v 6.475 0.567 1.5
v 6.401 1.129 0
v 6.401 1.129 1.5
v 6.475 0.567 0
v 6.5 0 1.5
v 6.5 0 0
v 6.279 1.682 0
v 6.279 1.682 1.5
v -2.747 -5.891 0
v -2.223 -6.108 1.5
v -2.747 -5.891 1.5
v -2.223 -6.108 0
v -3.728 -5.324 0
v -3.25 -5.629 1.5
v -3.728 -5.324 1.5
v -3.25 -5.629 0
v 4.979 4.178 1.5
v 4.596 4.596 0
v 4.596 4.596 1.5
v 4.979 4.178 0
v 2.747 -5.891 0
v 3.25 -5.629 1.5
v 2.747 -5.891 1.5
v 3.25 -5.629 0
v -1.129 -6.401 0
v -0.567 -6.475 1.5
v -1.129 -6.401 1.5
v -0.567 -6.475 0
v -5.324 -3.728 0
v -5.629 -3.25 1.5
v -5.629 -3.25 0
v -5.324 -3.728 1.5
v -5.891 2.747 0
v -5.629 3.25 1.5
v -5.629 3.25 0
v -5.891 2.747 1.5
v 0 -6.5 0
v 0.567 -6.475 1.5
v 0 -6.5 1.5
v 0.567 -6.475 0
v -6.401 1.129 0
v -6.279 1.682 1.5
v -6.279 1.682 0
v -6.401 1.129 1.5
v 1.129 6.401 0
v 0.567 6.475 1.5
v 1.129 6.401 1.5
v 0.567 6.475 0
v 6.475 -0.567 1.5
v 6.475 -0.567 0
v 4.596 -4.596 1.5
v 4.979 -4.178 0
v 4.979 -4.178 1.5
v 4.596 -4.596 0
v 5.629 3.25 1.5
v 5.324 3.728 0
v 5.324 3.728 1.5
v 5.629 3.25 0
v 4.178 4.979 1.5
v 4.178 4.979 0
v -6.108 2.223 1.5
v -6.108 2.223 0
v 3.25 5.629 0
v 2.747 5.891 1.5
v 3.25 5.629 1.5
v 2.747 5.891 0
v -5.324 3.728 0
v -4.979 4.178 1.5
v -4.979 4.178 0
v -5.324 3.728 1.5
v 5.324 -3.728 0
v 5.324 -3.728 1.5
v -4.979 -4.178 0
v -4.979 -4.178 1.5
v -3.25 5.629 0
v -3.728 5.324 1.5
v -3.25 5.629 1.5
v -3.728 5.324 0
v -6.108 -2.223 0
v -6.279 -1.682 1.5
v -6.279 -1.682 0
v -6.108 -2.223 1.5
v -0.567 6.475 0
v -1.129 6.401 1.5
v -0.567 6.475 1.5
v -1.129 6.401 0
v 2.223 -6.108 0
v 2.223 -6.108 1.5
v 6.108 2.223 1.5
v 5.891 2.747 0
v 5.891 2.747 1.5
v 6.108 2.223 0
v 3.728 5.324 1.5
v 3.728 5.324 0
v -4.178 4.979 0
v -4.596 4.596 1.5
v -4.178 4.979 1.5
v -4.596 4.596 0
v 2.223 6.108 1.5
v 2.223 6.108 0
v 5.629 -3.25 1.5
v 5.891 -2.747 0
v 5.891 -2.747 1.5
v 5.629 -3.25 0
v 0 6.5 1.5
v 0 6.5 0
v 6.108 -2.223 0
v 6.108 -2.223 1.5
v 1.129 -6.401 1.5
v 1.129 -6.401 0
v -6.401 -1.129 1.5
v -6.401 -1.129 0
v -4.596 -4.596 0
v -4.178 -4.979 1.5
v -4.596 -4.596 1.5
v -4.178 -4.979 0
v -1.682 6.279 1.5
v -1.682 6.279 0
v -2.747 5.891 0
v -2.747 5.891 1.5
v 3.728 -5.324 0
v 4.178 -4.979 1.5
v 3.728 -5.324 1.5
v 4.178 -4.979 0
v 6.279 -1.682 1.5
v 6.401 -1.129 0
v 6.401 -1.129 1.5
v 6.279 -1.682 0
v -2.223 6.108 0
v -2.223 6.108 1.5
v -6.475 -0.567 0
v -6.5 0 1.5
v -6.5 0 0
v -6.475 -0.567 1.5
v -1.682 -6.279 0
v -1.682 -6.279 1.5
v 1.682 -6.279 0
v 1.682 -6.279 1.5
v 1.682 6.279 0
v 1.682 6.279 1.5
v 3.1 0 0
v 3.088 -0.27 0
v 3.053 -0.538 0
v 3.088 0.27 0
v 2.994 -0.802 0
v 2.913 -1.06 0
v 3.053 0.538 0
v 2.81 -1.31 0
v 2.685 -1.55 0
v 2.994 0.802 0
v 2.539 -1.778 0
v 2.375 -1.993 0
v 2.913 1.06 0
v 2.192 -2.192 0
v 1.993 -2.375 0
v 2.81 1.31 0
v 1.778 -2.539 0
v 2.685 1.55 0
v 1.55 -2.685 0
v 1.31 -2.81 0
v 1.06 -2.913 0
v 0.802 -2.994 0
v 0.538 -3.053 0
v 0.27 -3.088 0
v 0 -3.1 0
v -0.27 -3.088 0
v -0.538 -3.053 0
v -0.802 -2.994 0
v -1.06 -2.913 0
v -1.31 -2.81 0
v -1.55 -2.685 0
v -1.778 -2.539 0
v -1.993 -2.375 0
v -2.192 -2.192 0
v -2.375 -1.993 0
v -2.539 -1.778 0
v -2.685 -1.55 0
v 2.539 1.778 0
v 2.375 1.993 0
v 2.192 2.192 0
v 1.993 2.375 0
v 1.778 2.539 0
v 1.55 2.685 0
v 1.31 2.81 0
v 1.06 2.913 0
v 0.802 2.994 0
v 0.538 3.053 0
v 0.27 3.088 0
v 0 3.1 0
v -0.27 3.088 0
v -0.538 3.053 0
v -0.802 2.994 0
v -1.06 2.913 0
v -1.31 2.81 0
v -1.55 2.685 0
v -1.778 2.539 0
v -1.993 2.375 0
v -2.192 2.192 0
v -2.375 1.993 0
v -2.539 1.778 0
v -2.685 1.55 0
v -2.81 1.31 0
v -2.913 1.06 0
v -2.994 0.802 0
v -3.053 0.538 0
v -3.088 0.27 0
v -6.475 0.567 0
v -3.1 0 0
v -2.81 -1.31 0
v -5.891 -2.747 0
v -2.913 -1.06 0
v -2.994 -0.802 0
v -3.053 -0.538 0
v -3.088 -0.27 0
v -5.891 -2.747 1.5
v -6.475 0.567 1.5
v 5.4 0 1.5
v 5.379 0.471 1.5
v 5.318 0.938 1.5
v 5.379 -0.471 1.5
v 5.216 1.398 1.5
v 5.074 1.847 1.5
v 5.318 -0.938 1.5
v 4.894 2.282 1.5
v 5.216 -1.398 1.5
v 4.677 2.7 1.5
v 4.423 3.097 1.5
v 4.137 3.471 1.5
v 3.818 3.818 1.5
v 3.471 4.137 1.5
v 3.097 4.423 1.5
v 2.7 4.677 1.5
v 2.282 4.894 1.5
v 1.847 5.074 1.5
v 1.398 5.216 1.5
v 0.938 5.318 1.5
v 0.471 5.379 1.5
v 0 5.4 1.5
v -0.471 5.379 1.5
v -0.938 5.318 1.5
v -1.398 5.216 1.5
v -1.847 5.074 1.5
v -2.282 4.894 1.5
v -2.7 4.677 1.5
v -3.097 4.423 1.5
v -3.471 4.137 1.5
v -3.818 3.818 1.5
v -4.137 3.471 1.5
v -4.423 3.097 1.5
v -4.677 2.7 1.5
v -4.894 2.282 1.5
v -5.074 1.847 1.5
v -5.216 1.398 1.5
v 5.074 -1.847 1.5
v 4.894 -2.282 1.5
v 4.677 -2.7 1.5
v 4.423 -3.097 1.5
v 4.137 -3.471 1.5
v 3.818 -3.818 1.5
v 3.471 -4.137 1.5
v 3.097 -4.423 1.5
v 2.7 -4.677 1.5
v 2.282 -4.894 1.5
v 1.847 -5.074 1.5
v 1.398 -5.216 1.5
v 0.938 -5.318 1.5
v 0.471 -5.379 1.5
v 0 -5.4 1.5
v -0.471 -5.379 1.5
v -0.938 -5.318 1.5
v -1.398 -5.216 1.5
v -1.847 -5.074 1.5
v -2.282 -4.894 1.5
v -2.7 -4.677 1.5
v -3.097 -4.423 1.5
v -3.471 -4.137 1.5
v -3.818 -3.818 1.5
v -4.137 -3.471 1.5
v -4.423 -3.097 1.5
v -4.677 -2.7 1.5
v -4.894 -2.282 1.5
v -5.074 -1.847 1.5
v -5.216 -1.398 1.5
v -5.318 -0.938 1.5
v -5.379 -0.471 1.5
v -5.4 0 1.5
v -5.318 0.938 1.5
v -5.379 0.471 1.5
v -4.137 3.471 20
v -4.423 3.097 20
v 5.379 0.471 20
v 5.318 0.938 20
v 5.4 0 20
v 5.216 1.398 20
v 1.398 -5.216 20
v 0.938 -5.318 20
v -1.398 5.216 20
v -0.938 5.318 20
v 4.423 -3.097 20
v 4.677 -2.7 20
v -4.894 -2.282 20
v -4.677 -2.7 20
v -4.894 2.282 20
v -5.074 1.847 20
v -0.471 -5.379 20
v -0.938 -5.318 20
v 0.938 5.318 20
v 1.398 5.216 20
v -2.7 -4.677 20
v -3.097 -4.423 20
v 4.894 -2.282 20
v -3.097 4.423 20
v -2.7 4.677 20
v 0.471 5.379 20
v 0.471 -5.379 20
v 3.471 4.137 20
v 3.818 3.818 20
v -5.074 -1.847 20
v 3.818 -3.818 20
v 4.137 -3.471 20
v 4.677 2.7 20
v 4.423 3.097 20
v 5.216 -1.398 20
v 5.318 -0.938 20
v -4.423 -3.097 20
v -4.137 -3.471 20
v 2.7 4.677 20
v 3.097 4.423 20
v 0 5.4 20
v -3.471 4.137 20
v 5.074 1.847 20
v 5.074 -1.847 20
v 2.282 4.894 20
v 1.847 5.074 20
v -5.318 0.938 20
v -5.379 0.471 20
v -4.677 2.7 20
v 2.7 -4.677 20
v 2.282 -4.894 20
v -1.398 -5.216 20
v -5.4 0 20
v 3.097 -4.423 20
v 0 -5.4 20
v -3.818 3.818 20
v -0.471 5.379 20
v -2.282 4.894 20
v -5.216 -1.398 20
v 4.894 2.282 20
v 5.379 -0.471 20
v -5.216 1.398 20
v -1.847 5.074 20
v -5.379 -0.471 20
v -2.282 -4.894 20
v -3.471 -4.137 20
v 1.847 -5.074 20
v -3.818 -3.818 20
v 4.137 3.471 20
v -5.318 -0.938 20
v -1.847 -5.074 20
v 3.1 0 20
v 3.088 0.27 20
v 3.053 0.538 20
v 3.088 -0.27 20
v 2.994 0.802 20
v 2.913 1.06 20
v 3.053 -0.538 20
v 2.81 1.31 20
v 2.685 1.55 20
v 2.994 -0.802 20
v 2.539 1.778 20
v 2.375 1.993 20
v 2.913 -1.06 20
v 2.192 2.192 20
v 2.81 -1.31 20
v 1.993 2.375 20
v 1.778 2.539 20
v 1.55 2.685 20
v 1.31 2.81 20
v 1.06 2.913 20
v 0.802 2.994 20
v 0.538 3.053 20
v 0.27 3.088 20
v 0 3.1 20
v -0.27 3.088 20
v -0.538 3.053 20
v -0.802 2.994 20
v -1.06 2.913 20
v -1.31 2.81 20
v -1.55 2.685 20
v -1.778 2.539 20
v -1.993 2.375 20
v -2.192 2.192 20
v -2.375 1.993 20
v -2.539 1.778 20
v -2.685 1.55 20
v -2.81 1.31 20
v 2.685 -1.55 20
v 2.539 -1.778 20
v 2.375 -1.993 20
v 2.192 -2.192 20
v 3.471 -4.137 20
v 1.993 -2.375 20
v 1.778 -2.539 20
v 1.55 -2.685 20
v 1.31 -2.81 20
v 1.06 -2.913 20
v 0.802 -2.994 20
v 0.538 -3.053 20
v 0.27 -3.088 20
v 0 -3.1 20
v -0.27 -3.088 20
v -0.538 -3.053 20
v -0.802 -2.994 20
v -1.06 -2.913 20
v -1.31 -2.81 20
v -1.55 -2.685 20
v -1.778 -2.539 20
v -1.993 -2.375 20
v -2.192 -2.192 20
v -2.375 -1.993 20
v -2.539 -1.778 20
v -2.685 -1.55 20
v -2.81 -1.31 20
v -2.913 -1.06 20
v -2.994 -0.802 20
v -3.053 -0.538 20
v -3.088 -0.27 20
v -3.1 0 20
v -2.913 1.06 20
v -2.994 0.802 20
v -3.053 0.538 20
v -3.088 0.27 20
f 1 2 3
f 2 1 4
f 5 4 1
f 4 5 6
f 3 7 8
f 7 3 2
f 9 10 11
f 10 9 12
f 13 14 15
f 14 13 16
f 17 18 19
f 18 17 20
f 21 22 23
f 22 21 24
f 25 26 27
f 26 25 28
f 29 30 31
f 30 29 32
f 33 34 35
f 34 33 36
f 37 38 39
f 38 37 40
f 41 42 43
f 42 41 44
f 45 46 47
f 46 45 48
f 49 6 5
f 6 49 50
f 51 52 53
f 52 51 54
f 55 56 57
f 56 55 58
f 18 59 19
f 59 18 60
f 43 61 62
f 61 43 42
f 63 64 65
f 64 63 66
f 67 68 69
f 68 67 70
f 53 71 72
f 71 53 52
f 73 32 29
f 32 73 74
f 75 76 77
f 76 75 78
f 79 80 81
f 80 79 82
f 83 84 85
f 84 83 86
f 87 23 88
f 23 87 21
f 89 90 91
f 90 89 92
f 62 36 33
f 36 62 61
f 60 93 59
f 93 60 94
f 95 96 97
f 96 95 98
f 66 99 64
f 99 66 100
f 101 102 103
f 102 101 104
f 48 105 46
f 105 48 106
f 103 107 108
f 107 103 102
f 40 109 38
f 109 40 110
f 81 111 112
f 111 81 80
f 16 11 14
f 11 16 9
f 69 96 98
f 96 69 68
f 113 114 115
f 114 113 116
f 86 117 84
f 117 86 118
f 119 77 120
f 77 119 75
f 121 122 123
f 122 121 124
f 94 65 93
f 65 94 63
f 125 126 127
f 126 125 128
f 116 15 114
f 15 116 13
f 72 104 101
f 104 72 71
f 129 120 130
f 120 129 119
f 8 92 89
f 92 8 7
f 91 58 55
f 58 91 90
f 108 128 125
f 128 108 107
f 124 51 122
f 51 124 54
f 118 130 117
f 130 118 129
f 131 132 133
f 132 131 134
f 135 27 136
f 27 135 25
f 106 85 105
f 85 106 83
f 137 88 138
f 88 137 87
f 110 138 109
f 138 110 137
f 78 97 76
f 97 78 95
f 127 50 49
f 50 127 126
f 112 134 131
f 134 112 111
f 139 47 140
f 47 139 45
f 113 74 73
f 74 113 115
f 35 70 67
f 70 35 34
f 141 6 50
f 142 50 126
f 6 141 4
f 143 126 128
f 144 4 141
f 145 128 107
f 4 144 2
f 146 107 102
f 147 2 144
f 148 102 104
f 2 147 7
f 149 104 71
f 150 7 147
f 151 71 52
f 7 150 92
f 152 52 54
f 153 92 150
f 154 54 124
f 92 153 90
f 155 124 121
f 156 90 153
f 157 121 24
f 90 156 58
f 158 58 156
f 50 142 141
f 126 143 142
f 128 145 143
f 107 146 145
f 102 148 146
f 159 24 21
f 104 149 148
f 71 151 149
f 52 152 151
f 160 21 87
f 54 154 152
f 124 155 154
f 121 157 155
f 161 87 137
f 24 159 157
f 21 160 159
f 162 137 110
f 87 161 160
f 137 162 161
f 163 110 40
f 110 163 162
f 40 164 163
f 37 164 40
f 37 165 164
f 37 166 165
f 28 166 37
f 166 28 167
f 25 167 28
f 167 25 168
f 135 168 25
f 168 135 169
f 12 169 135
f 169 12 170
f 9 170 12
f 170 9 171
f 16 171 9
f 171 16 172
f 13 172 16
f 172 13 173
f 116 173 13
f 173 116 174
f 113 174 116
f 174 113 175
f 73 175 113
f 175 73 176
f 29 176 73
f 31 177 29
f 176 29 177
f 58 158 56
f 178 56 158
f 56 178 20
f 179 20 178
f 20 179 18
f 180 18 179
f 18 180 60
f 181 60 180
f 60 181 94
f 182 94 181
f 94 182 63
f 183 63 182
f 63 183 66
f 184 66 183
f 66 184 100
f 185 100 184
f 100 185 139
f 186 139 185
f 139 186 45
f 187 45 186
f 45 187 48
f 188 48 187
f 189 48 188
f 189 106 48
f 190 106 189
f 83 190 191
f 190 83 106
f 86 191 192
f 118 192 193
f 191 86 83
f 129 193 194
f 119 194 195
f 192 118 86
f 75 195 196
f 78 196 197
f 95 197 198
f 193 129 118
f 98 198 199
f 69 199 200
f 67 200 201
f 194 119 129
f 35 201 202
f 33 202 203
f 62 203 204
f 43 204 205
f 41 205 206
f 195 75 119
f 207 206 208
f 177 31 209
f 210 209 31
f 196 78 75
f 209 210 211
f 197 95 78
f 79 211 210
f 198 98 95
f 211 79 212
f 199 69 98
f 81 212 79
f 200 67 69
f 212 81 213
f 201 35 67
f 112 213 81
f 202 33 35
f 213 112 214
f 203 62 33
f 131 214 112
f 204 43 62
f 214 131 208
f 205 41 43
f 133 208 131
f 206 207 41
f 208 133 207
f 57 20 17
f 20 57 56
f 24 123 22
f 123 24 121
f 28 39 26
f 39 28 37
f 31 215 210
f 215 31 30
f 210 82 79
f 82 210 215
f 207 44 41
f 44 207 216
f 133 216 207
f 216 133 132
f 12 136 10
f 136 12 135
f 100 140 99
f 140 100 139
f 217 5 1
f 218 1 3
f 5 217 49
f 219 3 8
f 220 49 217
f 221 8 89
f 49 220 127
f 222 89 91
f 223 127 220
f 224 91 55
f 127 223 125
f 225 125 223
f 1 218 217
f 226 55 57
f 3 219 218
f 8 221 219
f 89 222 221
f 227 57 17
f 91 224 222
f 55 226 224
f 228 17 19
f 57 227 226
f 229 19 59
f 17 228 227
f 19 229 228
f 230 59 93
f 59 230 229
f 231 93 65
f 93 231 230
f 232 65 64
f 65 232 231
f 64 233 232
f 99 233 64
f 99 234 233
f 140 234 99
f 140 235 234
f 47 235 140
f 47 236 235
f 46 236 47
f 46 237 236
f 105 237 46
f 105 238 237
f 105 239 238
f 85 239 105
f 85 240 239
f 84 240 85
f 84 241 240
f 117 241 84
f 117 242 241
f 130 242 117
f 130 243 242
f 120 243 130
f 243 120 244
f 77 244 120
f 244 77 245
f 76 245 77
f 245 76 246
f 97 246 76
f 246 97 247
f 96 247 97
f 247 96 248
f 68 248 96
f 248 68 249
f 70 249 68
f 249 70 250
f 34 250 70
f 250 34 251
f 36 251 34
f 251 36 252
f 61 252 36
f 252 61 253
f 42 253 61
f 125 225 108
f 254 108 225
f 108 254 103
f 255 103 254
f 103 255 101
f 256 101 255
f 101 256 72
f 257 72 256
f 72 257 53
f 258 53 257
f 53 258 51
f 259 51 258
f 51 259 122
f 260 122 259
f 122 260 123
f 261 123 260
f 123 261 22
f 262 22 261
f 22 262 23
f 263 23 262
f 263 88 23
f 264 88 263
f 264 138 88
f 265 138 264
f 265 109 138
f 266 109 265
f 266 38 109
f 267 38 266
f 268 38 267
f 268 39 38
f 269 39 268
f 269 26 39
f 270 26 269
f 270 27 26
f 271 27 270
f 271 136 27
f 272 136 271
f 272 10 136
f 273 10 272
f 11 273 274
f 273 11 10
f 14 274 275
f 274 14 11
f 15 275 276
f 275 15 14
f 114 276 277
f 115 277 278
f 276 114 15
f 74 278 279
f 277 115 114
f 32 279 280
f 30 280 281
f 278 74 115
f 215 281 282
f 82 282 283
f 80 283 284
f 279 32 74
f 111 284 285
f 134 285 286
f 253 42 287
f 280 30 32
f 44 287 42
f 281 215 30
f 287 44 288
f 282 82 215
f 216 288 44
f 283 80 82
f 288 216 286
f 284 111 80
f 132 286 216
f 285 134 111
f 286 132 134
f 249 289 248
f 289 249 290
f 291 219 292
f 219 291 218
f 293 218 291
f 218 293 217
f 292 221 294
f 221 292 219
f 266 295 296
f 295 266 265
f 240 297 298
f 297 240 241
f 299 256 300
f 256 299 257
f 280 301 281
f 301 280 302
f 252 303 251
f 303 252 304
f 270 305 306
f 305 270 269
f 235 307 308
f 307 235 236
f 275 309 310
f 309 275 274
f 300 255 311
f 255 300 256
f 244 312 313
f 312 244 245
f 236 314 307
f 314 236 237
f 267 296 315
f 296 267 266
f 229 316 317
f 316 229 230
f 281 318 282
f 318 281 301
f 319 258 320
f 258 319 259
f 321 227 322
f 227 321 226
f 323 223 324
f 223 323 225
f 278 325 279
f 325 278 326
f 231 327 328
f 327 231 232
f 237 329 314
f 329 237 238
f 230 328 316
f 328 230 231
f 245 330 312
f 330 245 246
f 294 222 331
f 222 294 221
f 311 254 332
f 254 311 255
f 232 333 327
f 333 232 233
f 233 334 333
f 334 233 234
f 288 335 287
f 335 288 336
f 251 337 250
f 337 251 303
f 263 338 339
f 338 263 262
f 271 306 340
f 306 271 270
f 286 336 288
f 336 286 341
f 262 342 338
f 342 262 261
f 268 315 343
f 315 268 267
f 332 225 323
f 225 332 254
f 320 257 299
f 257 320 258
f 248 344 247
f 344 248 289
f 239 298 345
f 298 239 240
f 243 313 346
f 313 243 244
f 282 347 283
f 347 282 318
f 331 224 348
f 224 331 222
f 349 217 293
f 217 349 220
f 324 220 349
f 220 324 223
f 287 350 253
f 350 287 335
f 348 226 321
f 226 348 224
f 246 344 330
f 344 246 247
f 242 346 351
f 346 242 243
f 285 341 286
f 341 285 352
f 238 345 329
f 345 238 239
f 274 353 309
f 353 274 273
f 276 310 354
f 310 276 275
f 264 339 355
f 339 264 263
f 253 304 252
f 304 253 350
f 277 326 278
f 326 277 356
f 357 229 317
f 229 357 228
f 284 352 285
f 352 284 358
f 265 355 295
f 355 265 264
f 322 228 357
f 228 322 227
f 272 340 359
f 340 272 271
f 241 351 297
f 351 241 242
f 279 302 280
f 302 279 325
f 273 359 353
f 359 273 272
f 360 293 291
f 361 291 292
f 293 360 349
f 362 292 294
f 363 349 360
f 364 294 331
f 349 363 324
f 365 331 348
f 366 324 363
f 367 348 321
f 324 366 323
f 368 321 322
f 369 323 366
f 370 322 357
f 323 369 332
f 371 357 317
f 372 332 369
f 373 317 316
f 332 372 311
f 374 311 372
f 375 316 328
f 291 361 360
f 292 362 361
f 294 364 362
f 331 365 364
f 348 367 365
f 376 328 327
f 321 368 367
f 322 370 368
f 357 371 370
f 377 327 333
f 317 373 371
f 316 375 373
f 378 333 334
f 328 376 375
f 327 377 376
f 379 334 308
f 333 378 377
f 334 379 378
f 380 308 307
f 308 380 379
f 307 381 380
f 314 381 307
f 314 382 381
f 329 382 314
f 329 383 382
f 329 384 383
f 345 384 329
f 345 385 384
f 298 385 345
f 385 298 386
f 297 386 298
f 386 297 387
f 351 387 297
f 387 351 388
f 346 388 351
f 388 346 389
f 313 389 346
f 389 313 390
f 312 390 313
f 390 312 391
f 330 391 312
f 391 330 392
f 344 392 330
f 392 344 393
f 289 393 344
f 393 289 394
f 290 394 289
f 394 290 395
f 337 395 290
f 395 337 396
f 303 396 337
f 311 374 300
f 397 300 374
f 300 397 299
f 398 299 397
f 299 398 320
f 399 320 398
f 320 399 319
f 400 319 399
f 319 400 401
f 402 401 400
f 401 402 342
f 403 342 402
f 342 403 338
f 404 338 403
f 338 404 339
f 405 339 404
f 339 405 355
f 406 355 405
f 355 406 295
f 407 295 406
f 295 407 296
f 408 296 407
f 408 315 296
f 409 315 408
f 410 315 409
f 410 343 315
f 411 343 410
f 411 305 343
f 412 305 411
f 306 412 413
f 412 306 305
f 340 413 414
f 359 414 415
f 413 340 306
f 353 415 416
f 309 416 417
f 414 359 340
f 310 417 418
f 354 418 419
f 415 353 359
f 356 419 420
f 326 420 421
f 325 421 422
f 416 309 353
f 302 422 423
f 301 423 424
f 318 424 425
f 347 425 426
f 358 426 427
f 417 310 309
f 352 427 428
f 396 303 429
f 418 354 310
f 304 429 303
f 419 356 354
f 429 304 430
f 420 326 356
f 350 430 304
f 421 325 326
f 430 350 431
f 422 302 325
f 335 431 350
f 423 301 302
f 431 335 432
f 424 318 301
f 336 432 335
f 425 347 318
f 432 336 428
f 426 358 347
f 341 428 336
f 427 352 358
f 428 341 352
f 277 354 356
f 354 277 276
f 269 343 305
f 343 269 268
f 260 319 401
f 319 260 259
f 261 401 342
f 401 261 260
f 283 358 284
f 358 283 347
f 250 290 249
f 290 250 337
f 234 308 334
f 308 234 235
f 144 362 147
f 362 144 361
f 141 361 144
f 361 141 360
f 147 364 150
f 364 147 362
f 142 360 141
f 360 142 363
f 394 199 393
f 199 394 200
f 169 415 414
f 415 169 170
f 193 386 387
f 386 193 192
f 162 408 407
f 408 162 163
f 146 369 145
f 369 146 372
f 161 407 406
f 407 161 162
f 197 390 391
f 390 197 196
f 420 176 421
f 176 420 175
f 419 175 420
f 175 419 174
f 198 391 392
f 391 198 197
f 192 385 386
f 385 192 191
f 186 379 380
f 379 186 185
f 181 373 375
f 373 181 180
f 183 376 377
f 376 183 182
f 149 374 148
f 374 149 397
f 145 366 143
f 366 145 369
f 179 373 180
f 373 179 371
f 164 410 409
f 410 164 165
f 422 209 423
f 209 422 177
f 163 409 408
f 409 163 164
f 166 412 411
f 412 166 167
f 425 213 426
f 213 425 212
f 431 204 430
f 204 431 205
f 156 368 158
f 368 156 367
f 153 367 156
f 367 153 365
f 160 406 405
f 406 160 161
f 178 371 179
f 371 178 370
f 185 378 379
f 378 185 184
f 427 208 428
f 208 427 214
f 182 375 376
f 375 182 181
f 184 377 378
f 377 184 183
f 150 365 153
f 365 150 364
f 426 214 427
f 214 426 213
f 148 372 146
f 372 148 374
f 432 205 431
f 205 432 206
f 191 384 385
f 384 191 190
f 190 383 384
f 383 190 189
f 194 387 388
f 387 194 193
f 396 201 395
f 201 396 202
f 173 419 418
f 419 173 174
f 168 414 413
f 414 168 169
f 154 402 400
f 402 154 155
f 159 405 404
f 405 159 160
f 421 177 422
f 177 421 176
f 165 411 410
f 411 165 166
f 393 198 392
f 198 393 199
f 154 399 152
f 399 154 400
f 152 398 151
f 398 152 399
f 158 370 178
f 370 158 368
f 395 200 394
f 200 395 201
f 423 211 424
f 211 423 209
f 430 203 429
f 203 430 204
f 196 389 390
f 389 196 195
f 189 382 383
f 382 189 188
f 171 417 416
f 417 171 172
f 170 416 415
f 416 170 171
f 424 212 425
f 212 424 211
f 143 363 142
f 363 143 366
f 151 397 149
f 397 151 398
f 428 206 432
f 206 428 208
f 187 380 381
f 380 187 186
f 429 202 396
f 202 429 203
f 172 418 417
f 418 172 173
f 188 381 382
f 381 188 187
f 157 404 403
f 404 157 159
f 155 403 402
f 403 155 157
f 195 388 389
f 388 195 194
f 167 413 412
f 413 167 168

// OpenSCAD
// Adapter sleeve - a collar with a sleeve body that lines a 1.5 mL tube rack hole to hold a
// 0.2 mL PCR tube, with a through bore. NOVEL general part (a generic tube adapter).
//

top_d     = 13;
body_d    = 10.8;
wall      = 1.5;
tube_d    = 6.2;
collar_h  = 1.5;
body_h    = 21.5 - 1.5;

$fn = 72;

collar_t = 1.5;
body_t   = wall;

difference() {
    union() {
        cylinder(h = collar_h, d = top_d);                 // collar lying on the bed
        cylinder(h = body_h, d = body_d);                   // sleeve body above
    }
    translate([0, 0, -1]) cylinder(h = collar_h + body_h + 2, d = tube_d);  // through bore
}
